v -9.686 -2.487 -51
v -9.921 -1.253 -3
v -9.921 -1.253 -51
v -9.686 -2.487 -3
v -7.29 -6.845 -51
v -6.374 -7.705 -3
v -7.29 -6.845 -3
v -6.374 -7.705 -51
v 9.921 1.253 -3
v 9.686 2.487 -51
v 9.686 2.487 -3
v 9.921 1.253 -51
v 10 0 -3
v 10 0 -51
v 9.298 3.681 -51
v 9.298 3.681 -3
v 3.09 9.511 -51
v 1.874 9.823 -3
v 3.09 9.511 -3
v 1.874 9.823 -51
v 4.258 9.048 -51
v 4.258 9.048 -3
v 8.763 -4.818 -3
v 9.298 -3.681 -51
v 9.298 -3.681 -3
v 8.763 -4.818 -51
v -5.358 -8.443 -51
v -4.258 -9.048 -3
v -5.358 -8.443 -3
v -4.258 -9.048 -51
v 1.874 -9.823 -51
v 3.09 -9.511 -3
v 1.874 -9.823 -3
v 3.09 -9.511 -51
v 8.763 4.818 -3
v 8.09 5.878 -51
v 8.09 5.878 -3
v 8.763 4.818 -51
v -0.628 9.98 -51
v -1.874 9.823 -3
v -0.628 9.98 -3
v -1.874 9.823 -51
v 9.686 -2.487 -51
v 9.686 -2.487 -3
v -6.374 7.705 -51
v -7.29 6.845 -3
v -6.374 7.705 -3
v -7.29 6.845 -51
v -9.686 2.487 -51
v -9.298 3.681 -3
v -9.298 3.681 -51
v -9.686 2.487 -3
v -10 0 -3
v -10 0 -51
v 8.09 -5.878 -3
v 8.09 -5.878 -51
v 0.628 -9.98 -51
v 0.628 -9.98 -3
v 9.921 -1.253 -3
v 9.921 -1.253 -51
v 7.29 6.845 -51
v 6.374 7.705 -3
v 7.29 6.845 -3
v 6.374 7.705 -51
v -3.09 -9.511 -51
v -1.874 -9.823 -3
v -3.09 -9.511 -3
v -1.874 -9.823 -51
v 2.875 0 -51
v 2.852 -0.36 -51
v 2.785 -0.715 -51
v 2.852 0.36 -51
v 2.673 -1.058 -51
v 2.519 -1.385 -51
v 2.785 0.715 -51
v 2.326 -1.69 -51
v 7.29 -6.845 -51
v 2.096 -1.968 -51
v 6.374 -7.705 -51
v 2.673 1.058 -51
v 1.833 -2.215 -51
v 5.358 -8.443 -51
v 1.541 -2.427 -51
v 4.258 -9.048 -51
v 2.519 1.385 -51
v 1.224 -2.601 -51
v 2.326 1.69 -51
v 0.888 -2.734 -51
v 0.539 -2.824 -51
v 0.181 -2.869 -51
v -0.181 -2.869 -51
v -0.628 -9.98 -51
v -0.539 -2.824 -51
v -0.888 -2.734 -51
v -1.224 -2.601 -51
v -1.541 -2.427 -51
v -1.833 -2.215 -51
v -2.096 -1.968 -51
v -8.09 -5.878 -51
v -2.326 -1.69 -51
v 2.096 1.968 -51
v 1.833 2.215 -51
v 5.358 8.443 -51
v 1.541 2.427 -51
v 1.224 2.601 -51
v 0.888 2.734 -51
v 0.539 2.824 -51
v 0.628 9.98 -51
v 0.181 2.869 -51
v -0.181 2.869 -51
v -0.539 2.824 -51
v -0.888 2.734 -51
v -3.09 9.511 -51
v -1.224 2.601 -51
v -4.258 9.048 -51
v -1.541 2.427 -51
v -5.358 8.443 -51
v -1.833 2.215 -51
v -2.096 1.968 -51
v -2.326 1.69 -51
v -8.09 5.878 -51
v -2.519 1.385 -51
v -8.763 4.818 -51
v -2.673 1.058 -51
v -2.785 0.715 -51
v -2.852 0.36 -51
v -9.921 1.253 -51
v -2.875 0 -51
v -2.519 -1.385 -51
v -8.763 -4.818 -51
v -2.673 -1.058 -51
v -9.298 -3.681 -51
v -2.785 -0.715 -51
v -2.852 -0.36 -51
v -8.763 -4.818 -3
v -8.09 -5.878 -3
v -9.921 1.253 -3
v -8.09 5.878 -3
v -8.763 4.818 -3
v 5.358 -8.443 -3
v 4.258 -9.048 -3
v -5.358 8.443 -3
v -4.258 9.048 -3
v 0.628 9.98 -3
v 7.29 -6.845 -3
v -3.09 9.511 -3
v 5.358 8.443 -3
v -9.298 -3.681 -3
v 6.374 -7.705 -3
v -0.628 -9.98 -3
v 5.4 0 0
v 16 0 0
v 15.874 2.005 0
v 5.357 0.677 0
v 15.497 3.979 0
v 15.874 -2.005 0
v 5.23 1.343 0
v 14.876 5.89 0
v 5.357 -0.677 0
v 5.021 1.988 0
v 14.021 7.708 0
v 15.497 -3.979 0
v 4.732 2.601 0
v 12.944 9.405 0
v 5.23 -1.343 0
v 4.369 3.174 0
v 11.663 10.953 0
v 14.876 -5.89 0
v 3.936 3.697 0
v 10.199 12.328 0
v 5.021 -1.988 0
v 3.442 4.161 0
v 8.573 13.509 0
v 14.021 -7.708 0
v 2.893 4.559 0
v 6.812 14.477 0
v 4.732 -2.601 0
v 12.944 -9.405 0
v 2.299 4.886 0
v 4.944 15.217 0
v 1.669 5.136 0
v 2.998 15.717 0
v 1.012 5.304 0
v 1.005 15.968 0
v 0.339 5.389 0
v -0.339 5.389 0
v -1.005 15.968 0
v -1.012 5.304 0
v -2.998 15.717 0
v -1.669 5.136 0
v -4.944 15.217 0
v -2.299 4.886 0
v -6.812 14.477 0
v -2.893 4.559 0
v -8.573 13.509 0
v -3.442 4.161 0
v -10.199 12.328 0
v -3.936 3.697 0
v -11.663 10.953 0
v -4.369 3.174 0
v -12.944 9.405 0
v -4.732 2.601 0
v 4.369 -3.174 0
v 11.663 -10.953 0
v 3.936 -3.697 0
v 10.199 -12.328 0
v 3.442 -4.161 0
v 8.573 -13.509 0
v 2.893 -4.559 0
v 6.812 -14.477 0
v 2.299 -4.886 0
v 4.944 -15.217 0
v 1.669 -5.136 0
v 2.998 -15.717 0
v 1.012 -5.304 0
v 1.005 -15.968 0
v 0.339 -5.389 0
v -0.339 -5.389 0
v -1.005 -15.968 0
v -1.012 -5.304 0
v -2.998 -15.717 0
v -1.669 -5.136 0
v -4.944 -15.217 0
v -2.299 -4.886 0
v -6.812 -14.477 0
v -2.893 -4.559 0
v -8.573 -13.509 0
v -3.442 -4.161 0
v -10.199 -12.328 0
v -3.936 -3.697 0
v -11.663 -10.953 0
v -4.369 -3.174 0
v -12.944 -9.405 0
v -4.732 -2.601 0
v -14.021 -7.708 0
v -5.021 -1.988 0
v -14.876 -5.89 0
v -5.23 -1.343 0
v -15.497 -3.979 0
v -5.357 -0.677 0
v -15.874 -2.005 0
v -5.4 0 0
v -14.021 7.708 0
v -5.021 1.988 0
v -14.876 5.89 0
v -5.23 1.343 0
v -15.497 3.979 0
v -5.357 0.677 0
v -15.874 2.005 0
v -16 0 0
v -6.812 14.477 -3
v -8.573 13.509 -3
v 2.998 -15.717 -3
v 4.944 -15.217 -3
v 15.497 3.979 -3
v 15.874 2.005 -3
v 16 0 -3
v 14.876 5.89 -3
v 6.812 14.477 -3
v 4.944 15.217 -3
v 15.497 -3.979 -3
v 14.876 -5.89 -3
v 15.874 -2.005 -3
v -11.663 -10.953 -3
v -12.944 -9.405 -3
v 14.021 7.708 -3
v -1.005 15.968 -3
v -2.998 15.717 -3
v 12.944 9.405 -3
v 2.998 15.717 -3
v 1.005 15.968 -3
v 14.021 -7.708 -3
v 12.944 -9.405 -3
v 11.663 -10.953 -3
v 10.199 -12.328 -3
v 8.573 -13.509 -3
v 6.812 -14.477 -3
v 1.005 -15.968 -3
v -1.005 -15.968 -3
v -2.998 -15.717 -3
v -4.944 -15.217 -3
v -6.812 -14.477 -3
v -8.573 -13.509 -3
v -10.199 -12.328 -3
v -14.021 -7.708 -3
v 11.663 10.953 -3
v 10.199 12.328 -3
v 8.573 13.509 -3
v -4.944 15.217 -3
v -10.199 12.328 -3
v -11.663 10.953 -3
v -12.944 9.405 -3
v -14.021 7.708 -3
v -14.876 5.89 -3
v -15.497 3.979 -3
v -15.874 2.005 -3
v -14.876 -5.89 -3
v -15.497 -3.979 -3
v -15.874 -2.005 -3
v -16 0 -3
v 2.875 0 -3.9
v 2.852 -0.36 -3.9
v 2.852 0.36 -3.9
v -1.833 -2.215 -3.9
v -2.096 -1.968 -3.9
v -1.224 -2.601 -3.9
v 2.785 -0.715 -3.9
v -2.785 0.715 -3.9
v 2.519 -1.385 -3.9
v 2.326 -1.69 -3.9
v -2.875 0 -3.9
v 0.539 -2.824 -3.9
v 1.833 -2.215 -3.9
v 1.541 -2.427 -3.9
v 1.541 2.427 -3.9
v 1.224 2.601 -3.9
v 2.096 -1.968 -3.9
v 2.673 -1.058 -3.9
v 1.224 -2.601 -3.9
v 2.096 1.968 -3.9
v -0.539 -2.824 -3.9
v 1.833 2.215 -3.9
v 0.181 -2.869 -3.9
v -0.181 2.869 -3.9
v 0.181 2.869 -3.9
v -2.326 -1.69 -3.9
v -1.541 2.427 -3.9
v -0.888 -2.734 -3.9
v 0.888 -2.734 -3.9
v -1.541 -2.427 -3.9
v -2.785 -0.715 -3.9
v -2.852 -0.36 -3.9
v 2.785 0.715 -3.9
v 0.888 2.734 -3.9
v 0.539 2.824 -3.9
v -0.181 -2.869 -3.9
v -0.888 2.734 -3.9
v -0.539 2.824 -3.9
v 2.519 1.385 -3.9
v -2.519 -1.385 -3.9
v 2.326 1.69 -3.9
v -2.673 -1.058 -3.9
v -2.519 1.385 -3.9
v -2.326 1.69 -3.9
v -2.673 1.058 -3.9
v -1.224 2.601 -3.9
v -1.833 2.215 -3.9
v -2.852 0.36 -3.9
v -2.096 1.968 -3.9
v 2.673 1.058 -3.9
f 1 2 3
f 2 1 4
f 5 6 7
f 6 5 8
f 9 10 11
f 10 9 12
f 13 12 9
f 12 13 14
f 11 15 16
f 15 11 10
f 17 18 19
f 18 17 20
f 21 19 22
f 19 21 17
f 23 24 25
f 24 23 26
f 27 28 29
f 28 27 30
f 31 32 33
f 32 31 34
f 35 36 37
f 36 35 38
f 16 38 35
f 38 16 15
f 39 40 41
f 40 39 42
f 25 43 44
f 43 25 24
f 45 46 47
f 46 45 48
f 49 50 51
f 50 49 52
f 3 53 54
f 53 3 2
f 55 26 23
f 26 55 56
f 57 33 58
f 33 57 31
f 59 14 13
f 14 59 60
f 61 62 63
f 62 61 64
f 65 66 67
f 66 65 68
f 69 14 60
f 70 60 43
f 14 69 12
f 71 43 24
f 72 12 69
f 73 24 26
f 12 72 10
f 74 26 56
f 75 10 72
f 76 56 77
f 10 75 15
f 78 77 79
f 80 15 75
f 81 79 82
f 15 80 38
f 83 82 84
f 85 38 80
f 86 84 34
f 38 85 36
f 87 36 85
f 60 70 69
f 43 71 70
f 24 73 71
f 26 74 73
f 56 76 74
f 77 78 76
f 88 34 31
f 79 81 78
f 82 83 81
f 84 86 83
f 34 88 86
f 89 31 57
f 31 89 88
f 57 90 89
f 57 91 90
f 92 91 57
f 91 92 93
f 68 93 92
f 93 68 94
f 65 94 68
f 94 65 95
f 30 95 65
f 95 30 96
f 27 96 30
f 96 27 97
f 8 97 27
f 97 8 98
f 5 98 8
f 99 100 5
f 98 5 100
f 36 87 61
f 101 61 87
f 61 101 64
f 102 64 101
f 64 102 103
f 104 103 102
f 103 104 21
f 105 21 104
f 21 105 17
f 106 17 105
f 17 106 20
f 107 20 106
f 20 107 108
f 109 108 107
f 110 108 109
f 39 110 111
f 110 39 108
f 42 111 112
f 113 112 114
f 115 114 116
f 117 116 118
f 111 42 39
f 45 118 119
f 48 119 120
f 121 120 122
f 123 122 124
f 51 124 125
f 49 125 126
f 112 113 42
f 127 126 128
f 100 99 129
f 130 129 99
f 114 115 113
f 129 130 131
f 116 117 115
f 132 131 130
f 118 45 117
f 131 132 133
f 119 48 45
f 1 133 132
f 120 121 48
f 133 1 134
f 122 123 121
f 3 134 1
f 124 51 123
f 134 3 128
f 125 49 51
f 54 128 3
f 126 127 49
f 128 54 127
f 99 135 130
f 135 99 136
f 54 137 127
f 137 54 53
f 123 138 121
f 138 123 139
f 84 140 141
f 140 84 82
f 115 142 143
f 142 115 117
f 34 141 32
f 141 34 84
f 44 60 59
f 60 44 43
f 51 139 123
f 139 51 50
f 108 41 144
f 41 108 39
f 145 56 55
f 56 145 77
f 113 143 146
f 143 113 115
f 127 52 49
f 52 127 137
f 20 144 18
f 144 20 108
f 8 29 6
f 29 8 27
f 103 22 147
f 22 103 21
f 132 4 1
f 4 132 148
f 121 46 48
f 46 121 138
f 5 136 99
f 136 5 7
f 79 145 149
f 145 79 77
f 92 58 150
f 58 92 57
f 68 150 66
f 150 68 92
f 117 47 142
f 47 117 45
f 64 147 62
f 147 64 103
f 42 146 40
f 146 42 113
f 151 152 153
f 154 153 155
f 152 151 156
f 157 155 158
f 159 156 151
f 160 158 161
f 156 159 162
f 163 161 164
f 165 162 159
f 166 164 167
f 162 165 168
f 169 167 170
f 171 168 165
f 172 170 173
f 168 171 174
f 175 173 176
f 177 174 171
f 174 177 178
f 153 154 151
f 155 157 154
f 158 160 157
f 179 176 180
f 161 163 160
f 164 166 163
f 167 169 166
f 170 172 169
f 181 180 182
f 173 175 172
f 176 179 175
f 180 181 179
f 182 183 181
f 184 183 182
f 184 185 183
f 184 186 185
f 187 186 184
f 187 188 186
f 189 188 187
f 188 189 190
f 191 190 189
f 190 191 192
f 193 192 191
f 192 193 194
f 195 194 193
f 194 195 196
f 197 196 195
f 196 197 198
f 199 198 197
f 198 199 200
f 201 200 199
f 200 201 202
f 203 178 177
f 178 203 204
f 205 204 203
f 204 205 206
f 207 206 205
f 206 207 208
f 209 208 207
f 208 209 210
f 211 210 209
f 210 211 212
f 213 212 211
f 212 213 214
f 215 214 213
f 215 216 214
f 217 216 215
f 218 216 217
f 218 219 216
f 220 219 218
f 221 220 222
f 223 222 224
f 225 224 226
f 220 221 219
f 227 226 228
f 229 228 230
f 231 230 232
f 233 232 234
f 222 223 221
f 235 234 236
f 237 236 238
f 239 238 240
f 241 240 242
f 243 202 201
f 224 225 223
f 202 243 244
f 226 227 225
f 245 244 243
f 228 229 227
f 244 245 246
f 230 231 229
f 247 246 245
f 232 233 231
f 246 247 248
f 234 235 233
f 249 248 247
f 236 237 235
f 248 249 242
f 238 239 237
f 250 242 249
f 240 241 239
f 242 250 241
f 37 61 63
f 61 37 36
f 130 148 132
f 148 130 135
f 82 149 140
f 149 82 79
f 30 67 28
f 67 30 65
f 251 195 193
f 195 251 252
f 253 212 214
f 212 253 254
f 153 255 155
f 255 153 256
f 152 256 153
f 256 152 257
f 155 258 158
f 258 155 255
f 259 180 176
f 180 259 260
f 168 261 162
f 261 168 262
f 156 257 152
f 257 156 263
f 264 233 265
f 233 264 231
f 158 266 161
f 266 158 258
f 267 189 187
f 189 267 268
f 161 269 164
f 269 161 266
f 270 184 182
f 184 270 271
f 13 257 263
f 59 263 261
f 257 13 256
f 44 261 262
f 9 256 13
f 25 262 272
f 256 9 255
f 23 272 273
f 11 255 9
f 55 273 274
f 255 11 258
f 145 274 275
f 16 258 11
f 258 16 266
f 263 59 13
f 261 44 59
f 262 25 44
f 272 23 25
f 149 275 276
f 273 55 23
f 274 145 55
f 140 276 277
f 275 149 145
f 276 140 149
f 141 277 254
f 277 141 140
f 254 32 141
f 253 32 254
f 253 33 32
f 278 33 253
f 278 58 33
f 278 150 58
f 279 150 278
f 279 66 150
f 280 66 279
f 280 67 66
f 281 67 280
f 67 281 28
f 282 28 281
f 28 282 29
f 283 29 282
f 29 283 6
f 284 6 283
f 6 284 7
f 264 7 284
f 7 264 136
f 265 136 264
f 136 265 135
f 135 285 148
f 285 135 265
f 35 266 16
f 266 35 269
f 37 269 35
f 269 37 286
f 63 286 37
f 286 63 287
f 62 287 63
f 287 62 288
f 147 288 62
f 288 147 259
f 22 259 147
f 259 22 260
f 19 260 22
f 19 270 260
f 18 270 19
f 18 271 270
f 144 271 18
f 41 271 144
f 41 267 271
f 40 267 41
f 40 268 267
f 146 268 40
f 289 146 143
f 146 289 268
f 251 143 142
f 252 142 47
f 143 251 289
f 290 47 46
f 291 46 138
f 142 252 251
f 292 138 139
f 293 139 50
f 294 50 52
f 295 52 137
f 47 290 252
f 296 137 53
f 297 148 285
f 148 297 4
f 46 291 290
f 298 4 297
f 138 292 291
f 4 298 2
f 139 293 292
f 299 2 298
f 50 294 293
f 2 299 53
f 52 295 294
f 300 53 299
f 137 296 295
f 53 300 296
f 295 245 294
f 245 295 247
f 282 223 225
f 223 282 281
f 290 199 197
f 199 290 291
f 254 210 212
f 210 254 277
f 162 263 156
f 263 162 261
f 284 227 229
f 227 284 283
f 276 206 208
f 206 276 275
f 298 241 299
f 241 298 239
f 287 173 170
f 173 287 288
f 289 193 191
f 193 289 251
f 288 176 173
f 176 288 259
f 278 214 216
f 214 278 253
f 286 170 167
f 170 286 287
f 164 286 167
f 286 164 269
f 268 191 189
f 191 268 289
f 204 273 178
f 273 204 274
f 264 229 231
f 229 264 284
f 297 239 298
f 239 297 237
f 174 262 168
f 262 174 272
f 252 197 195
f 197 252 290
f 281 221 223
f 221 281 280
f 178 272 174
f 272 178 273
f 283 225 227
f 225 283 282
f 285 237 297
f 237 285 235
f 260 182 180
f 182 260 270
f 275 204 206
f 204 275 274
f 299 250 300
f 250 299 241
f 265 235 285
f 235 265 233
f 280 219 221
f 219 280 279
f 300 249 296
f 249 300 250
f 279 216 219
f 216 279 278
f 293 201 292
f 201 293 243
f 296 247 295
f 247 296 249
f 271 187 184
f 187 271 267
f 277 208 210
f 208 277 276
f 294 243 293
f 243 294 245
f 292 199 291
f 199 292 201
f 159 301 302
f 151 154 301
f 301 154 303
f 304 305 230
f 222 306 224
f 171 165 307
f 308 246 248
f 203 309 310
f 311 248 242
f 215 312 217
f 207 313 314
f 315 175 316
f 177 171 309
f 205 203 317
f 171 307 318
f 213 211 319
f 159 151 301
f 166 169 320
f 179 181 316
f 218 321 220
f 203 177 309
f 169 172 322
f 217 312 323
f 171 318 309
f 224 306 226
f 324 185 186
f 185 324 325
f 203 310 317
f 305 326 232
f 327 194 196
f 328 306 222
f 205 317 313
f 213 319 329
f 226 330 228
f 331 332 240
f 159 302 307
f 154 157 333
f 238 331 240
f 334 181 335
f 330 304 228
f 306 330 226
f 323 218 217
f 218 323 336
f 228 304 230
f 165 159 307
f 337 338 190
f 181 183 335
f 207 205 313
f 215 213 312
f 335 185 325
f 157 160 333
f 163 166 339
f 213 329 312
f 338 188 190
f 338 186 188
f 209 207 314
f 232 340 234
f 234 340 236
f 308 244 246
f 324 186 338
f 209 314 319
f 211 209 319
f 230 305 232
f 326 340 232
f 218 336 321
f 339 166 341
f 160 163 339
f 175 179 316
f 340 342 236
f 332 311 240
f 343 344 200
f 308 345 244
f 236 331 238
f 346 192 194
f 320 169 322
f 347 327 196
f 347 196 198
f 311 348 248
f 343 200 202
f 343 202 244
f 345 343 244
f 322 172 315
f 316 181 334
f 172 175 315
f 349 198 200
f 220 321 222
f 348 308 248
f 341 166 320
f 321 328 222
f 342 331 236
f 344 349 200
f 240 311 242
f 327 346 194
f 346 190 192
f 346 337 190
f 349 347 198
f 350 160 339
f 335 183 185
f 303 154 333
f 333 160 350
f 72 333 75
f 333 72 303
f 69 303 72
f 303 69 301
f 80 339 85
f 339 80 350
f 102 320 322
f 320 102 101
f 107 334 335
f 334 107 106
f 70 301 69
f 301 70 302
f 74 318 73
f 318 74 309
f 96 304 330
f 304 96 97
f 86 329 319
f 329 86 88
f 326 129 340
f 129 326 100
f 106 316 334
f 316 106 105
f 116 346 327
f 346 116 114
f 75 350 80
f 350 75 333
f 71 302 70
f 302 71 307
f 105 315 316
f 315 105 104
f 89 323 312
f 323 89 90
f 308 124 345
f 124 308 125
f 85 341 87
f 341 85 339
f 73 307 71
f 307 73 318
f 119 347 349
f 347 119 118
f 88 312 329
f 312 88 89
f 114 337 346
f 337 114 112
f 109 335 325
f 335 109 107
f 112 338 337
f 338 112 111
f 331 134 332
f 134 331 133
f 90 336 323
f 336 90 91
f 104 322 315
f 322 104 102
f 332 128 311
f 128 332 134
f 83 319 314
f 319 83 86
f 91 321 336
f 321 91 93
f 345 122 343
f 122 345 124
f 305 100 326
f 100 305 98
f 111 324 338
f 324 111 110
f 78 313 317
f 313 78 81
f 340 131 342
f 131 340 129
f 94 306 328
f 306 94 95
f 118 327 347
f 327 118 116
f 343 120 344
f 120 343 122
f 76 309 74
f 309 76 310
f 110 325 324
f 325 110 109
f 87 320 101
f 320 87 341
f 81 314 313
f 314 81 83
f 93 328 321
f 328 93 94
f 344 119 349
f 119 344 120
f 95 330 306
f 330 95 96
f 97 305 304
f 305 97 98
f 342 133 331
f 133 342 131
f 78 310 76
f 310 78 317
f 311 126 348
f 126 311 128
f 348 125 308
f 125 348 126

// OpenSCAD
$fn = 50;


difference() {
	union() {
		translate(v = [0, 0, -51.0000000000]) {
			cylinder(h = 51, r = 10.0000000000);
		}
		translate(v = [0, 0, -3.0000000000]) {
			cylinder(h = 3, r = 16.0000000000);
		}
	}
	union() {
		translate(v = [0, 0, 0]) {
			rotate(a = [0, 0, 0]) {
				difference() {
					union() {
						#translate(v = [0, 0, -51.0000000000]) {
							cylinder(h = 51, r = 2.6000000000);
						}
						#translate(v = [0, 0, -3.9000000000]) {
							cylinder(h = 3.9000000000, r1 = 2.8750000000, r2 = 5.4000000000);
						}
						#translate(v = [0, 0, -51.0000000000]) {
							cylinder(h = 51, r = 2.8750000000);
						}
						#translate(v = [0, 0, -51.0000000000]) {
							cylinder(h = 51, r = 2.6000000000);
						}
					}
					union();
				}
			}
		}
	}
}
